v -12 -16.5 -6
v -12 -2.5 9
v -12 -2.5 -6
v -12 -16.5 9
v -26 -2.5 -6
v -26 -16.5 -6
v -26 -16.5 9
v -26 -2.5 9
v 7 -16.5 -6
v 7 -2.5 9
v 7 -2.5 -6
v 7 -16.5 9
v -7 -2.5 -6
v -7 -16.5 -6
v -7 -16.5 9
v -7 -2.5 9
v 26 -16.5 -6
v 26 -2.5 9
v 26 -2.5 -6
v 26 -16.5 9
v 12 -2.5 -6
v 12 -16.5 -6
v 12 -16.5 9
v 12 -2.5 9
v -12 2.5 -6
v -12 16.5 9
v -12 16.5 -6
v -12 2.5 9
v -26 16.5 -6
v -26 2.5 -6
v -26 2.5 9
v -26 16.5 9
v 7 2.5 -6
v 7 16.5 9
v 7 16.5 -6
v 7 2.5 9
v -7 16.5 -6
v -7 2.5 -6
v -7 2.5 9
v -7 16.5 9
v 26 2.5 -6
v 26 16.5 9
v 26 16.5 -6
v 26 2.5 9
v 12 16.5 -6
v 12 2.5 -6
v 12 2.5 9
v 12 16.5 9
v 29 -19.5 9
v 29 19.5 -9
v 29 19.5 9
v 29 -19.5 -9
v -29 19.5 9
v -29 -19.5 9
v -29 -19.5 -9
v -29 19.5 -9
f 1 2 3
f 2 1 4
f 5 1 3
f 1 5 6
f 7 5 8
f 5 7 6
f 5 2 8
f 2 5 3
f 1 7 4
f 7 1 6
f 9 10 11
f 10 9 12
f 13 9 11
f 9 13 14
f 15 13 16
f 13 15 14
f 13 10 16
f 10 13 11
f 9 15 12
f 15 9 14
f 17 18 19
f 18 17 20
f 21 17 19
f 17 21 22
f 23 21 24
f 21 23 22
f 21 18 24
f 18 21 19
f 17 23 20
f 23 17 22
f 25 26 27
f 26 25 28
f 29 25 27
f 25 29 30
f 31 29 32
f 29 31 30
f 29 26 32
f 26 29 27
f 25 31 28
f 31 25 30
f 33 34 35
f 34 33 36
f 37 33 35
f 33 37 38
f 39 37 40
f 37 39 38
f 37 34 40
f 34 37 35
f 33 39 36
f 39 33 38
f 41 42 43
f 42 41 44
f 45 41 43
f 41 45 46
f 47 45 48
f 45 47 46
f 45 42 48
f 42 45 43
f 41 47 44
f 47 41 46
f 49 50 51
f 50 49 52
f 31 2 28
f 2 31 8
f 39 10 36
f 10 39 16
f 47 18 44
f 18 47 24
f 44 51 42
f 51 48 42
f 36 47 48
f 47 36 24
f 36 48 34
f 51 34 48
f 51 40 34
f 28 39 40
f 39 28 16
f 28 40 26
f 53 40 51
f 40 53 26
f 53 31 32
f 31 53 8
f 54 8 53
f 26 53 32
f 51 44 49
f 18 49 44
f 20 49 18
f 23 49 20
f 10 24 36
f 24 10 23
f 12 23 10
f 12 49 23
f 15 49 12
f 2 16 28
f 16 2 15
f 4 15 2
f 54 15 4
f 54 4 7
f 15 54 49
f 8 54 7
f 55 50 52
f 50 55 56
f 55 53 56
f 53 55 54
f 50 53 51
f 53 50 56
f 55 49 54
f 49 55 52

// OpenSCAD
$fn = 32;

// ----------------------------------------------------------------------
// Pocket plate 58 x 39 x 18
// 2 x 3 pockets 14 mm square, 15 mm deep
// ----------------------------------------------------------------------

// --- parameters (mm) ---
thickness = 18;  // plate thickness
floor_t = 3;     // material left under each pocket
pocket = 14;     // pocket side length
pitch_x = 19;    // pocket pitch along X
pitch_y = 19;    // pocket pitch along Y
cols = 3;        // pockets per row
rows = 2;        // rows of pockets

// --- derived feature positions (mm) ---
depth = thickness - floor_t;        // = 15   pocket depth, down to the floor
span_x = (cols - 1) * pitch_x;      // = 38   distance between outer pockets
span_y = (rows - 1) * pitch_y;      // = 19   distance between outer pocket rows
origin_x = -span_x / 2;             // = -19   X of the first pocket
origin_y = -span_y / 2;             // = -9.5   Y of the first pocket
plate = [span_x + pocket + 6, span_y + pocket + 6, thickness];  // = [58, 39, 18]   overall size: pockets plus 3 mm of wall on each side
feature_centers = [
  [origin_x + 0 * pitch_x, origin_y + 0 * pitch_y],
  [origin_x + 1 * pitch_x, origin_y + 0 * pitch_y],
  [origin_x + 2 * pitch_x, origin_y + 0 * pitch_y],
  [origin_x + 0 * pitch_x, origin_y + 1 * pitch_y],
  [origin_x + 1 * pitch_x, origin_y + 1 * pitch_y],
  [origin_x + 2 * pitch_x, origin_y + 1 * pitch_y]
];   // pocket centres, used verbatim by the cutter loop

// plate outline, then one pocket per centre in feature_centers
difference() {
  cube(plate, center = true);
  for (centre = feature_centers)
    translate([centre[0] - pocket / 2, centre[1] - pocket / 2, plate[2] / 2 - depth])
      cube([pocket, pocket, depth + 1]);  // centred on the declared pocket centre
}
